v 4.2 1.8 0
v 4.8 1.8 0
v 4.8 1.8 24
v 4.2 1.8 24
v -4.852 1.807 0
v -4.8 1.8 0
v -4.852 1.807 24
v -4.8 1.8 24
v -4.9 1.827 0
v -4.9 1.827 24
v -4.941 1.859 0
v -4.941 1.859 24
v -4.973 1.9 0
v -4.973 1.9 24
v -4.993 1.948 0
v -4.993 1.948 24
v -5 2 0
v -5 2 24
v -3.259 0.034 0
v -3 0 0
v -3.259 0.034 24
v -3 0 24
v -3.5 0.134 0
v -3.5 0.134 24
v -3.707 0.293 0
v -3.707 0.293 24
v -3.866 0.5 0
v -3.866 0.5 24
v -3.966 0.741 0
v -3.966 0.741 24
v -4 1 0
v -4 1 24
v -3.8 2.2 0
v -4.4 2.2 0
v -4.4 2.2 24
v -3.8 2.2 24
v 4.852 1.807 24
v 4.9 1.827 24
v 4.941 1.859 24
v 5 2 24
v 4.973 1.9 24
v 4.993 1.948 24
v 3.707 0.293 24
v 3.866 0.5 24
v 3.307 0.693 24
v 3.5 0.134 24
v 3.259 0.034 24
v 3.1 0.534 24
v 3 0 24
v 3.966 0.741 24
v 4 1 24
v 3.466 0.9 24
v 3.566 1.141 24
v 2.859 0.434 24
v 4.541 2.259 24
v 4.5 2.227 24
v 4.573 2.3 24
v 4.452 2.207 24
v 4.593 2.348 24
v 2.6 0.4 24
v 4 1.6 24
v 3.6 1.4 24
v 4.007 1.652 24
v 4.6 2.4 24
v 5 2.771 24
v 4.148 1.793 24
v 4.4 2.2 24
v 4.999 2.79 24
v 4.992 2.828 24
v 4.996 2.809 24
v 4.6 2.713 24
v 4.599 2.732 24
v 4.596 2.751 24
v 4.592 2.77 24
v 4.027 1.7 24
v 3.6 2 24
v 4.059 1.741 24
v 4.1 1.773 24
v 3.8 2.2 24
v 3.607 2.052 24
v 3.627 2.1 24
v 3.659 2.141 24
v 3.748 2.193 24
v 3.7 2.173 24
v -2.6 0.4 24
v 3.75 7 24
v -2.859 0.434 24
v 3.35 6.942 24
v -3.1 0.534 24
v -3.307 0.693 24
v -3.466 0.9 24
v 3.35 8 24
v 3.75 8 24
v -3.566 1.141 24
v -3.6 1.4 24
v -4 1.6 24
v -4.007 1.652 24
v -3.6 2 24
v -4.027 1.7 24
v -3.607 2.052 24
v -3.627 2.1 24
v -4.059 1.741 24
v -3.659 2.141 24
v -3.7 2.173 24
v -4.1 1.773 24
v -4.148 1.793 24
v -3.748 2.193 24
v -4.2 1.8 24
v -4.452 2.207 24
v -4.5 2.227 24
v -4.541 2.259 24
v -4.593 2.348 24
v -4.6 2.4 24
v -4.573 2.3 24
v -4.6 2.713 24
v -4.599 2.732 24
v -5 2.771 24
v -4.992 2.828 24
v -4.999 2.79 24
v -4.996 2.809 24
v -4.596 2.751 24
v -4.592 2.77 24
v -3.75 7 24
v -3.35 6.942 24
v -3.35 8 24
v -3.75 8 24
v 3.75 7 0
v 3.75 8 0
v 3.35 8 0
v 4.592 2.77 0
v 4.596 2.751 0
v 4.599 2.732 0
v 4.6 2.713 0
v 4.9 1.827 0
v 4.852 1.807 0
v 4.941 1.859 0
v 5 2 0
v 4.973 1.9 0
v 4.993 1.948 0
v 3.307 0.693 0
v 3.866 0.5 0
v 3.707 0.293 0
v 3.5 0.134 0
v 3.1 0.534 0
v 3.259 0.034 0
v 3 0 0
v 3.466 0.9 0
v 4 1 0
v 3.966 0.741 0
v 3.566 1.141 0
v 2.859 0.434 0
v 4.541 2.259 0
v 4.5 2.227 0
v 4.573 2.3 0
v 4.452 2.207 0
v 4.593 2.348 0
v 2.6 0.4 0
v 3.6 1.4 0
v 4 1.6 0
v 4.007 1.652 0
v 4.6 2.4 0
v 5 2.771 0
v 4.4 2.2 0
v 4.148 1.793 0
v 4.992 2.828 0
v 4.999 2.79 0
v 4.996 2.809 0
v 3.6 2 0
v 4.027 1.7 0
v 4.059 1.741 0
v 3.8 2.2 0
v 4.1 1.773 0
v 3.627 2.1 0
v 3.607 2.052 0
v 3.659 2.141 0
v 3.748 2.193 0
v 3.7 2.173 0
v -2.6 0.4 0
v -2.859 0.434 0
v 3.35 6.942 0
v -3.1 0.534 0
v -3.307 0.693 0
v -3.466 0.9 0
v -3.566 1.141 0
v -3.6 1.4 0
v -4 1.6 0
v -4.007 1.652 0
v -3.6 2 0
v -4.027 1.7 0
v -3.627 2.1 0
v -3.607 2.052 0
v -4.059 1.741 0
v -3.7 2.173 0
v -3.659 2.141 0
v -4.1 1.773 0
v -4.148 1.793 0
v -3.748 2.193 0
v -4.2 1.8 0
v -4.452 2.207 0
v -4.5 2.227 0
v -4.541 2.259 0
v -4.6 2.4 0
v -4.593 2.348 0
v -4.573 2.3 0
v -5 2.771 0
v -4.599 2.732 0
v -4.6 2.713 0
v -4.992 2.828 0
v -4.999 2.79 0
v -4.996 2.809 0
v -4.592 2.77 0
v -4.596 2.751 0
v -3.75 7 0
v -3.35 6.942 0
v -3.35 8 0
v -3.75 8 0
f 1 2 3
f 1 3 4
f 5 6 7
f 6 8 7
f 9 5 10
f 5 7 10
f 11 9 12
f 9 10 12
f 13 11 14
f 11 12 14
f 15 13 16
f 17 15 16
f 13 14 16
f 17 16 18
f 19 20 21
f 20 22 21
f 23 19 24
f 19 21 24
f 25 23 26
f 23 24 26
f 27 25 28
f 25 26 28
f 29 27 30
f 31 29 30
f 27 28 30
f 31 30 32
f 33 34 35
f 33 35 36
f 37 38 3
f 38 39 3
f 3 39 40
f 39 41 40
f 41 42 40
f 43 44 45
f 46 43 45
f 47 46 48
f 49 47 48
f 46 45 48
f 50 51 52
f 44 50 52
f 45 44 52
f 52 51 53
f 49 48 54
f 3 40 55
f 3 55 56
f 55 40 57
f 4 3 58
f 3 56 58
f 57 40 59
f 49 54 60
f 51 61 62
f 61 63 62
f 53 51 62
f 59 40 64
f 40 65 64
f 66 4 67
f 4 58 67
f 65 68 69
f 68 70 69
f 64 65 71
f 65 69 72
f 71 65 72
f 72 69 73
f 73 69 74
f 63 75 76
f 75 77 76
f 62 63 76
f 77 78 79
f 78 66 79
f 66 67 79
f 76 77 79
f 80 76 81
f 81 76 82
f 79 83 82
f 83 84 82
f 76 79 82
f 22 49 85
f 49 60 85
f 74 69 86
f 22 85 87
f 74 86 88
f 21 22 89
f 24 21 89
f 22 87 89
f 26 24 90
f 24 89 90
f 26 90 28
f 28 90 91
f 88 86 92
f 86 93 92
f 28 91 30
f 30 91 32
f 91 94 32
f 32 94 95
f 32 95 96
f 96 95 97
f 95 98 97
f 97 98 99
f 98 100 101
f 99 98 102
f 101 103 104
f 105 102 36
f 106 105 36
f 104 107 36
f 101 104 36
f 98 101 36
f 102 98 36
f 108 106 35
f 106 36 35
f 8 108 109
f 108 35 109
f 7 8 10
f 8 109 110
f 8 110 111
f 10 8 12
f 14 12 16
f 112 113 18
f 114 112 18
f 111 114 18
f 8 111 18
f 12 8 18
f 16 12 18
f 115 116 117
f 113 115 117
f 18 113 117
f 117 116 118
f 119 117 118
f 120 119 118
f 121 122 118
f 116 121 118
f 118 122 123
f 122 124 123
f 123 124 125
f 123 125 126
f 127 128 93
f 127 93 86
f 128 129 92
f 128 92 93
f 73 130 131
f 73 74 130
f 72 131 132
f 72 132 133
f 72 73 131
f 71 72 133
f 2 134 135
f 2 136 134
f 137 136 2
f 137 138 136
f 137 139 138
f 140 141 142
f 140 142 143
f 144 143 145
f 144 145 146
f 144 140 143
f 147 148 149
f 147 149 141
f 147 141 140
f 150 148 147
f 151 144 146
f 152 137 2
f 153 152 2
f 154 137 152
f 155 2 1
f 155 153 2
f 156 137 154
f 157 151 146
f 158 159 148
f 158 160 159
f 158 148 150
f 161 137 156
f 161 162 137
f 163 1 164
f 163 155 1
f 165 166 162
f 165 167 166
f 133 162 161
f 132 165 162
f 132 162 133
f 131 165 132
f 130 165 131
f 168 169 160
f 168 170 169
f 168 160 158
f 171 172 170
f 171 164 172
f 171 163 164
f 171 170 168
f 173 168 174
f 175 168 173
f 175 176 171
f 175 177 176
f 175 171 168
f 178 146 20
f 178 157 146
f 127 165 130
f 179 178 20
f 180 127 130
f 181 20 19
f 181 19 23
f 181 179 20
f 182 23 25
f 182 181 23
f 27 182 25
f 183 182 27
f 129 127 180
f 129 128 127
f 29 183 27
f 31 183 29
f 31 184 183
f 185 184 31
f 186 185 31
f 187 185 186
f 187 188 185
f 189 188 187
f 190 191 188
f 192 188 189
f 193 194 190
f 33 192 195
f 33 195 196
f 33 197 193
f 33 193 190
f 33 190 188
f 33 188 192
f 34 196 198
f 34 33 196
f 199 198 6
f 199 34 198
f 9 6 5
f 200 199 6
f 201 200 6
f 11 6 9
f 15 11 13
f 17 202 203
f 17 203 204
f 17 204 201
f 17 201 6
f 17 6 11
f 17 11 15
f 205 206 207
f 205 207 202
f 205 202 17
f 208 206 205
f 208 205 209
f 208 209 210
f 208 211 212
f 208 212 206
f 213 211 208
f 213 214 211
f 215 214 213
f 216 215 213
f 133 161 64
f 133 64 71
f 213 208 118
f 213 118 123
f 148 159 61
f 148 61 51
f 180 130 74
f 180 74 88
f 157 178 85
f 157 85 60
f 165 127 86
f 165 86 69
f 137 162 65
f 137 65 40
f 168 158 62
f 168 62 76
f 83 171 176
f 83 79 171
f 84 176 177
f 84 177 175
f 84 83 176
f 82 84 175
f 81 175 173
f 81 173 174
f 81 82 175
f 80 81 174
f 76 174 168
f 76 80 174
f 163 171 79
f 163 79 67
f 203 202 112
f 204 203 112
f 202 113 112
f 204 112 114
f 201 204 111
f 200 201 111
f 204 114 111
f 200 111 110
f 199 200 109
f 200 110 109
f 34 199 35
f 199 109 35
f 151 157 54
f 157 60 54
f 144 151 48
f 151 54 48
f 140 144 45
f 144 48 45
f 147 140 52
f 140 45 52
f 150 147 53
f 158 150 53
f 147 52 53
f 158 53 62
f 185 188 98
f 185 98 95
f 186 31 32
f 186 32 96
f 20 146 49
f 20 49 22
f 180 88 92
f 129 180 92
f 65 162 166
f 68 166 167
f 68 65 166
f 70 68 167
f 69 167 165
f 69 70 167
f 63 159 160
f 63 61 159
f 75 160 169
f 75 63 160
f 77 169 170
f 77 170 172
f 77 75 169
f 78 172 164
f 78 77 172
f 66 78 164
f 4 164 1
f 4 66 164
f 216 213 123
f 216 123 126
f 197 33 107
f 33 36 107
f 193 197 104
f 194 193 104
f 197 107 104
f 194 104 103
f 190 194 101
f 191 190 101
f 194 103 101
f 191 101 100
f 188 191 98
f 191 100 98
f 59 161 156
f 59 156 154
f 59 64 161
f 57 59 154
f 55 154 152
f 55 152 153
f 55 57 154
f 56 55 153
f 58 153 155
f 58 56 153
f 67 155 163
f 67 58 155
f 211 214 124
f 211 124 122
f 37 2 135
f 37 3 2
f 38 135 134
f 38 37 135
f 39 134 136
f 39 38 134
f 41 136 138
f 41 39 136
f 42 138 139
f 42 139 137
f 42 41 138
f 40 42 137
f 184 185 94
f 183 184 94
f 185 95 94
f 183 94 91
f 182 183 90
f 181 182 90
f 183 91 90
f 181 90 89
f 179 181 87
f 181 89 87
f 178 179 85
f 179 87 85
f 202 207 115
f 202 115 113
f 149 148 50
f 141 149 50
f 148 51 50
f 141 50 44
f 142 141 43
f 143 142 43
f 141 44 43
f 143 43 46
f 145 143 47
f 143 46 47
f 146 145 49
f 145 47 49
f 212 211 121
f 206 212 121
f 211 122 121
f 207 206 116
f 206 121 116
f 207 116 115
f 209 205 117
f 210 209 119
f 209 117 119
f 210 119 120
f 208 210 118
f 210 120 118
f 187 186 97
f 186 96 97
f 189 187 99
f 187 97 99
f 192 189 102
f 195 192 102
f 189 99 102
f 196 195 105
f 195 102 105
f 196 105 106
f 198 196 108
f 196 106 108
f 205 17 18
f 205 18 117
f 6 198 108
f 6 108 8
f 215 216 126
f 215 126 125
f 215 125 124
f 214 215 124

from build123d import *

# Parameters (mm, degrees)
EXTRUDE_THIN1_DEPTH = 24
FILLET1_R           = 1
FILLET2_R           = 0.2


with BuildPart() as part:
    # Sketch1 → Extrude-Thin1 (new body)
    with BuildSketch(Plane.XY):
        Polygon((3.75, 8), (3.75, 7), (5, 2.8), (5, 1.8), (4, 1.8), (4, 0), (-4, 0), (-4, 1.8), (-5, 1.8), (-5, 2.8), (-3.75, 7), (-3.75, 8), (-3.35, 8), (-3.35, 6.941738969), (-4.6, 2.741738969), (-4.6, 2.2), (-3.6, 2.2), (-3.6, 0.4), (3.6, 0.4), (3.6, 2.2), (4.6, 2.2), (4.6, 2.741738969), (3.35, 6.941738969), (3.35, 8), align=None)
    extrude(amount=EXTRUDE_THIN1_DEPTH)

    # Fillet1
    fillet1_edges = [part.edges().sort_by_distance(p)[0] for p in [
        (4, 0, 12),
        (-4, 0, 12),
        (-3.6, 0.4, 12),
        (3.6, 0.4, 12),
    ]]
    fillet(fillet1_edges, radius=FILLET1_R)

    # Fillet2
    fillet2_edges = [part.edges().sort_by_distance(p)[0] for p in [
        (5, 2.8, 12),
        (5, 1.8, 12),
        (4, 1.8, 12),
        (-4, 1.8, 12),
        (-5, 1.8, 12),
        (-5, 2.8, 12),
        (-4.6, 2.741738969, 12),
        (-4.6, 2.2, 12),
        (-3.6, 2.2, 12),
        (3.6, 2.2, 12),
        (4.6, 2.2, 12),
        (4.6, 2.741738969, 12),
    ]]
    fillet(fillet2_edges, radius=FILLET2_R)


solid = part.part
